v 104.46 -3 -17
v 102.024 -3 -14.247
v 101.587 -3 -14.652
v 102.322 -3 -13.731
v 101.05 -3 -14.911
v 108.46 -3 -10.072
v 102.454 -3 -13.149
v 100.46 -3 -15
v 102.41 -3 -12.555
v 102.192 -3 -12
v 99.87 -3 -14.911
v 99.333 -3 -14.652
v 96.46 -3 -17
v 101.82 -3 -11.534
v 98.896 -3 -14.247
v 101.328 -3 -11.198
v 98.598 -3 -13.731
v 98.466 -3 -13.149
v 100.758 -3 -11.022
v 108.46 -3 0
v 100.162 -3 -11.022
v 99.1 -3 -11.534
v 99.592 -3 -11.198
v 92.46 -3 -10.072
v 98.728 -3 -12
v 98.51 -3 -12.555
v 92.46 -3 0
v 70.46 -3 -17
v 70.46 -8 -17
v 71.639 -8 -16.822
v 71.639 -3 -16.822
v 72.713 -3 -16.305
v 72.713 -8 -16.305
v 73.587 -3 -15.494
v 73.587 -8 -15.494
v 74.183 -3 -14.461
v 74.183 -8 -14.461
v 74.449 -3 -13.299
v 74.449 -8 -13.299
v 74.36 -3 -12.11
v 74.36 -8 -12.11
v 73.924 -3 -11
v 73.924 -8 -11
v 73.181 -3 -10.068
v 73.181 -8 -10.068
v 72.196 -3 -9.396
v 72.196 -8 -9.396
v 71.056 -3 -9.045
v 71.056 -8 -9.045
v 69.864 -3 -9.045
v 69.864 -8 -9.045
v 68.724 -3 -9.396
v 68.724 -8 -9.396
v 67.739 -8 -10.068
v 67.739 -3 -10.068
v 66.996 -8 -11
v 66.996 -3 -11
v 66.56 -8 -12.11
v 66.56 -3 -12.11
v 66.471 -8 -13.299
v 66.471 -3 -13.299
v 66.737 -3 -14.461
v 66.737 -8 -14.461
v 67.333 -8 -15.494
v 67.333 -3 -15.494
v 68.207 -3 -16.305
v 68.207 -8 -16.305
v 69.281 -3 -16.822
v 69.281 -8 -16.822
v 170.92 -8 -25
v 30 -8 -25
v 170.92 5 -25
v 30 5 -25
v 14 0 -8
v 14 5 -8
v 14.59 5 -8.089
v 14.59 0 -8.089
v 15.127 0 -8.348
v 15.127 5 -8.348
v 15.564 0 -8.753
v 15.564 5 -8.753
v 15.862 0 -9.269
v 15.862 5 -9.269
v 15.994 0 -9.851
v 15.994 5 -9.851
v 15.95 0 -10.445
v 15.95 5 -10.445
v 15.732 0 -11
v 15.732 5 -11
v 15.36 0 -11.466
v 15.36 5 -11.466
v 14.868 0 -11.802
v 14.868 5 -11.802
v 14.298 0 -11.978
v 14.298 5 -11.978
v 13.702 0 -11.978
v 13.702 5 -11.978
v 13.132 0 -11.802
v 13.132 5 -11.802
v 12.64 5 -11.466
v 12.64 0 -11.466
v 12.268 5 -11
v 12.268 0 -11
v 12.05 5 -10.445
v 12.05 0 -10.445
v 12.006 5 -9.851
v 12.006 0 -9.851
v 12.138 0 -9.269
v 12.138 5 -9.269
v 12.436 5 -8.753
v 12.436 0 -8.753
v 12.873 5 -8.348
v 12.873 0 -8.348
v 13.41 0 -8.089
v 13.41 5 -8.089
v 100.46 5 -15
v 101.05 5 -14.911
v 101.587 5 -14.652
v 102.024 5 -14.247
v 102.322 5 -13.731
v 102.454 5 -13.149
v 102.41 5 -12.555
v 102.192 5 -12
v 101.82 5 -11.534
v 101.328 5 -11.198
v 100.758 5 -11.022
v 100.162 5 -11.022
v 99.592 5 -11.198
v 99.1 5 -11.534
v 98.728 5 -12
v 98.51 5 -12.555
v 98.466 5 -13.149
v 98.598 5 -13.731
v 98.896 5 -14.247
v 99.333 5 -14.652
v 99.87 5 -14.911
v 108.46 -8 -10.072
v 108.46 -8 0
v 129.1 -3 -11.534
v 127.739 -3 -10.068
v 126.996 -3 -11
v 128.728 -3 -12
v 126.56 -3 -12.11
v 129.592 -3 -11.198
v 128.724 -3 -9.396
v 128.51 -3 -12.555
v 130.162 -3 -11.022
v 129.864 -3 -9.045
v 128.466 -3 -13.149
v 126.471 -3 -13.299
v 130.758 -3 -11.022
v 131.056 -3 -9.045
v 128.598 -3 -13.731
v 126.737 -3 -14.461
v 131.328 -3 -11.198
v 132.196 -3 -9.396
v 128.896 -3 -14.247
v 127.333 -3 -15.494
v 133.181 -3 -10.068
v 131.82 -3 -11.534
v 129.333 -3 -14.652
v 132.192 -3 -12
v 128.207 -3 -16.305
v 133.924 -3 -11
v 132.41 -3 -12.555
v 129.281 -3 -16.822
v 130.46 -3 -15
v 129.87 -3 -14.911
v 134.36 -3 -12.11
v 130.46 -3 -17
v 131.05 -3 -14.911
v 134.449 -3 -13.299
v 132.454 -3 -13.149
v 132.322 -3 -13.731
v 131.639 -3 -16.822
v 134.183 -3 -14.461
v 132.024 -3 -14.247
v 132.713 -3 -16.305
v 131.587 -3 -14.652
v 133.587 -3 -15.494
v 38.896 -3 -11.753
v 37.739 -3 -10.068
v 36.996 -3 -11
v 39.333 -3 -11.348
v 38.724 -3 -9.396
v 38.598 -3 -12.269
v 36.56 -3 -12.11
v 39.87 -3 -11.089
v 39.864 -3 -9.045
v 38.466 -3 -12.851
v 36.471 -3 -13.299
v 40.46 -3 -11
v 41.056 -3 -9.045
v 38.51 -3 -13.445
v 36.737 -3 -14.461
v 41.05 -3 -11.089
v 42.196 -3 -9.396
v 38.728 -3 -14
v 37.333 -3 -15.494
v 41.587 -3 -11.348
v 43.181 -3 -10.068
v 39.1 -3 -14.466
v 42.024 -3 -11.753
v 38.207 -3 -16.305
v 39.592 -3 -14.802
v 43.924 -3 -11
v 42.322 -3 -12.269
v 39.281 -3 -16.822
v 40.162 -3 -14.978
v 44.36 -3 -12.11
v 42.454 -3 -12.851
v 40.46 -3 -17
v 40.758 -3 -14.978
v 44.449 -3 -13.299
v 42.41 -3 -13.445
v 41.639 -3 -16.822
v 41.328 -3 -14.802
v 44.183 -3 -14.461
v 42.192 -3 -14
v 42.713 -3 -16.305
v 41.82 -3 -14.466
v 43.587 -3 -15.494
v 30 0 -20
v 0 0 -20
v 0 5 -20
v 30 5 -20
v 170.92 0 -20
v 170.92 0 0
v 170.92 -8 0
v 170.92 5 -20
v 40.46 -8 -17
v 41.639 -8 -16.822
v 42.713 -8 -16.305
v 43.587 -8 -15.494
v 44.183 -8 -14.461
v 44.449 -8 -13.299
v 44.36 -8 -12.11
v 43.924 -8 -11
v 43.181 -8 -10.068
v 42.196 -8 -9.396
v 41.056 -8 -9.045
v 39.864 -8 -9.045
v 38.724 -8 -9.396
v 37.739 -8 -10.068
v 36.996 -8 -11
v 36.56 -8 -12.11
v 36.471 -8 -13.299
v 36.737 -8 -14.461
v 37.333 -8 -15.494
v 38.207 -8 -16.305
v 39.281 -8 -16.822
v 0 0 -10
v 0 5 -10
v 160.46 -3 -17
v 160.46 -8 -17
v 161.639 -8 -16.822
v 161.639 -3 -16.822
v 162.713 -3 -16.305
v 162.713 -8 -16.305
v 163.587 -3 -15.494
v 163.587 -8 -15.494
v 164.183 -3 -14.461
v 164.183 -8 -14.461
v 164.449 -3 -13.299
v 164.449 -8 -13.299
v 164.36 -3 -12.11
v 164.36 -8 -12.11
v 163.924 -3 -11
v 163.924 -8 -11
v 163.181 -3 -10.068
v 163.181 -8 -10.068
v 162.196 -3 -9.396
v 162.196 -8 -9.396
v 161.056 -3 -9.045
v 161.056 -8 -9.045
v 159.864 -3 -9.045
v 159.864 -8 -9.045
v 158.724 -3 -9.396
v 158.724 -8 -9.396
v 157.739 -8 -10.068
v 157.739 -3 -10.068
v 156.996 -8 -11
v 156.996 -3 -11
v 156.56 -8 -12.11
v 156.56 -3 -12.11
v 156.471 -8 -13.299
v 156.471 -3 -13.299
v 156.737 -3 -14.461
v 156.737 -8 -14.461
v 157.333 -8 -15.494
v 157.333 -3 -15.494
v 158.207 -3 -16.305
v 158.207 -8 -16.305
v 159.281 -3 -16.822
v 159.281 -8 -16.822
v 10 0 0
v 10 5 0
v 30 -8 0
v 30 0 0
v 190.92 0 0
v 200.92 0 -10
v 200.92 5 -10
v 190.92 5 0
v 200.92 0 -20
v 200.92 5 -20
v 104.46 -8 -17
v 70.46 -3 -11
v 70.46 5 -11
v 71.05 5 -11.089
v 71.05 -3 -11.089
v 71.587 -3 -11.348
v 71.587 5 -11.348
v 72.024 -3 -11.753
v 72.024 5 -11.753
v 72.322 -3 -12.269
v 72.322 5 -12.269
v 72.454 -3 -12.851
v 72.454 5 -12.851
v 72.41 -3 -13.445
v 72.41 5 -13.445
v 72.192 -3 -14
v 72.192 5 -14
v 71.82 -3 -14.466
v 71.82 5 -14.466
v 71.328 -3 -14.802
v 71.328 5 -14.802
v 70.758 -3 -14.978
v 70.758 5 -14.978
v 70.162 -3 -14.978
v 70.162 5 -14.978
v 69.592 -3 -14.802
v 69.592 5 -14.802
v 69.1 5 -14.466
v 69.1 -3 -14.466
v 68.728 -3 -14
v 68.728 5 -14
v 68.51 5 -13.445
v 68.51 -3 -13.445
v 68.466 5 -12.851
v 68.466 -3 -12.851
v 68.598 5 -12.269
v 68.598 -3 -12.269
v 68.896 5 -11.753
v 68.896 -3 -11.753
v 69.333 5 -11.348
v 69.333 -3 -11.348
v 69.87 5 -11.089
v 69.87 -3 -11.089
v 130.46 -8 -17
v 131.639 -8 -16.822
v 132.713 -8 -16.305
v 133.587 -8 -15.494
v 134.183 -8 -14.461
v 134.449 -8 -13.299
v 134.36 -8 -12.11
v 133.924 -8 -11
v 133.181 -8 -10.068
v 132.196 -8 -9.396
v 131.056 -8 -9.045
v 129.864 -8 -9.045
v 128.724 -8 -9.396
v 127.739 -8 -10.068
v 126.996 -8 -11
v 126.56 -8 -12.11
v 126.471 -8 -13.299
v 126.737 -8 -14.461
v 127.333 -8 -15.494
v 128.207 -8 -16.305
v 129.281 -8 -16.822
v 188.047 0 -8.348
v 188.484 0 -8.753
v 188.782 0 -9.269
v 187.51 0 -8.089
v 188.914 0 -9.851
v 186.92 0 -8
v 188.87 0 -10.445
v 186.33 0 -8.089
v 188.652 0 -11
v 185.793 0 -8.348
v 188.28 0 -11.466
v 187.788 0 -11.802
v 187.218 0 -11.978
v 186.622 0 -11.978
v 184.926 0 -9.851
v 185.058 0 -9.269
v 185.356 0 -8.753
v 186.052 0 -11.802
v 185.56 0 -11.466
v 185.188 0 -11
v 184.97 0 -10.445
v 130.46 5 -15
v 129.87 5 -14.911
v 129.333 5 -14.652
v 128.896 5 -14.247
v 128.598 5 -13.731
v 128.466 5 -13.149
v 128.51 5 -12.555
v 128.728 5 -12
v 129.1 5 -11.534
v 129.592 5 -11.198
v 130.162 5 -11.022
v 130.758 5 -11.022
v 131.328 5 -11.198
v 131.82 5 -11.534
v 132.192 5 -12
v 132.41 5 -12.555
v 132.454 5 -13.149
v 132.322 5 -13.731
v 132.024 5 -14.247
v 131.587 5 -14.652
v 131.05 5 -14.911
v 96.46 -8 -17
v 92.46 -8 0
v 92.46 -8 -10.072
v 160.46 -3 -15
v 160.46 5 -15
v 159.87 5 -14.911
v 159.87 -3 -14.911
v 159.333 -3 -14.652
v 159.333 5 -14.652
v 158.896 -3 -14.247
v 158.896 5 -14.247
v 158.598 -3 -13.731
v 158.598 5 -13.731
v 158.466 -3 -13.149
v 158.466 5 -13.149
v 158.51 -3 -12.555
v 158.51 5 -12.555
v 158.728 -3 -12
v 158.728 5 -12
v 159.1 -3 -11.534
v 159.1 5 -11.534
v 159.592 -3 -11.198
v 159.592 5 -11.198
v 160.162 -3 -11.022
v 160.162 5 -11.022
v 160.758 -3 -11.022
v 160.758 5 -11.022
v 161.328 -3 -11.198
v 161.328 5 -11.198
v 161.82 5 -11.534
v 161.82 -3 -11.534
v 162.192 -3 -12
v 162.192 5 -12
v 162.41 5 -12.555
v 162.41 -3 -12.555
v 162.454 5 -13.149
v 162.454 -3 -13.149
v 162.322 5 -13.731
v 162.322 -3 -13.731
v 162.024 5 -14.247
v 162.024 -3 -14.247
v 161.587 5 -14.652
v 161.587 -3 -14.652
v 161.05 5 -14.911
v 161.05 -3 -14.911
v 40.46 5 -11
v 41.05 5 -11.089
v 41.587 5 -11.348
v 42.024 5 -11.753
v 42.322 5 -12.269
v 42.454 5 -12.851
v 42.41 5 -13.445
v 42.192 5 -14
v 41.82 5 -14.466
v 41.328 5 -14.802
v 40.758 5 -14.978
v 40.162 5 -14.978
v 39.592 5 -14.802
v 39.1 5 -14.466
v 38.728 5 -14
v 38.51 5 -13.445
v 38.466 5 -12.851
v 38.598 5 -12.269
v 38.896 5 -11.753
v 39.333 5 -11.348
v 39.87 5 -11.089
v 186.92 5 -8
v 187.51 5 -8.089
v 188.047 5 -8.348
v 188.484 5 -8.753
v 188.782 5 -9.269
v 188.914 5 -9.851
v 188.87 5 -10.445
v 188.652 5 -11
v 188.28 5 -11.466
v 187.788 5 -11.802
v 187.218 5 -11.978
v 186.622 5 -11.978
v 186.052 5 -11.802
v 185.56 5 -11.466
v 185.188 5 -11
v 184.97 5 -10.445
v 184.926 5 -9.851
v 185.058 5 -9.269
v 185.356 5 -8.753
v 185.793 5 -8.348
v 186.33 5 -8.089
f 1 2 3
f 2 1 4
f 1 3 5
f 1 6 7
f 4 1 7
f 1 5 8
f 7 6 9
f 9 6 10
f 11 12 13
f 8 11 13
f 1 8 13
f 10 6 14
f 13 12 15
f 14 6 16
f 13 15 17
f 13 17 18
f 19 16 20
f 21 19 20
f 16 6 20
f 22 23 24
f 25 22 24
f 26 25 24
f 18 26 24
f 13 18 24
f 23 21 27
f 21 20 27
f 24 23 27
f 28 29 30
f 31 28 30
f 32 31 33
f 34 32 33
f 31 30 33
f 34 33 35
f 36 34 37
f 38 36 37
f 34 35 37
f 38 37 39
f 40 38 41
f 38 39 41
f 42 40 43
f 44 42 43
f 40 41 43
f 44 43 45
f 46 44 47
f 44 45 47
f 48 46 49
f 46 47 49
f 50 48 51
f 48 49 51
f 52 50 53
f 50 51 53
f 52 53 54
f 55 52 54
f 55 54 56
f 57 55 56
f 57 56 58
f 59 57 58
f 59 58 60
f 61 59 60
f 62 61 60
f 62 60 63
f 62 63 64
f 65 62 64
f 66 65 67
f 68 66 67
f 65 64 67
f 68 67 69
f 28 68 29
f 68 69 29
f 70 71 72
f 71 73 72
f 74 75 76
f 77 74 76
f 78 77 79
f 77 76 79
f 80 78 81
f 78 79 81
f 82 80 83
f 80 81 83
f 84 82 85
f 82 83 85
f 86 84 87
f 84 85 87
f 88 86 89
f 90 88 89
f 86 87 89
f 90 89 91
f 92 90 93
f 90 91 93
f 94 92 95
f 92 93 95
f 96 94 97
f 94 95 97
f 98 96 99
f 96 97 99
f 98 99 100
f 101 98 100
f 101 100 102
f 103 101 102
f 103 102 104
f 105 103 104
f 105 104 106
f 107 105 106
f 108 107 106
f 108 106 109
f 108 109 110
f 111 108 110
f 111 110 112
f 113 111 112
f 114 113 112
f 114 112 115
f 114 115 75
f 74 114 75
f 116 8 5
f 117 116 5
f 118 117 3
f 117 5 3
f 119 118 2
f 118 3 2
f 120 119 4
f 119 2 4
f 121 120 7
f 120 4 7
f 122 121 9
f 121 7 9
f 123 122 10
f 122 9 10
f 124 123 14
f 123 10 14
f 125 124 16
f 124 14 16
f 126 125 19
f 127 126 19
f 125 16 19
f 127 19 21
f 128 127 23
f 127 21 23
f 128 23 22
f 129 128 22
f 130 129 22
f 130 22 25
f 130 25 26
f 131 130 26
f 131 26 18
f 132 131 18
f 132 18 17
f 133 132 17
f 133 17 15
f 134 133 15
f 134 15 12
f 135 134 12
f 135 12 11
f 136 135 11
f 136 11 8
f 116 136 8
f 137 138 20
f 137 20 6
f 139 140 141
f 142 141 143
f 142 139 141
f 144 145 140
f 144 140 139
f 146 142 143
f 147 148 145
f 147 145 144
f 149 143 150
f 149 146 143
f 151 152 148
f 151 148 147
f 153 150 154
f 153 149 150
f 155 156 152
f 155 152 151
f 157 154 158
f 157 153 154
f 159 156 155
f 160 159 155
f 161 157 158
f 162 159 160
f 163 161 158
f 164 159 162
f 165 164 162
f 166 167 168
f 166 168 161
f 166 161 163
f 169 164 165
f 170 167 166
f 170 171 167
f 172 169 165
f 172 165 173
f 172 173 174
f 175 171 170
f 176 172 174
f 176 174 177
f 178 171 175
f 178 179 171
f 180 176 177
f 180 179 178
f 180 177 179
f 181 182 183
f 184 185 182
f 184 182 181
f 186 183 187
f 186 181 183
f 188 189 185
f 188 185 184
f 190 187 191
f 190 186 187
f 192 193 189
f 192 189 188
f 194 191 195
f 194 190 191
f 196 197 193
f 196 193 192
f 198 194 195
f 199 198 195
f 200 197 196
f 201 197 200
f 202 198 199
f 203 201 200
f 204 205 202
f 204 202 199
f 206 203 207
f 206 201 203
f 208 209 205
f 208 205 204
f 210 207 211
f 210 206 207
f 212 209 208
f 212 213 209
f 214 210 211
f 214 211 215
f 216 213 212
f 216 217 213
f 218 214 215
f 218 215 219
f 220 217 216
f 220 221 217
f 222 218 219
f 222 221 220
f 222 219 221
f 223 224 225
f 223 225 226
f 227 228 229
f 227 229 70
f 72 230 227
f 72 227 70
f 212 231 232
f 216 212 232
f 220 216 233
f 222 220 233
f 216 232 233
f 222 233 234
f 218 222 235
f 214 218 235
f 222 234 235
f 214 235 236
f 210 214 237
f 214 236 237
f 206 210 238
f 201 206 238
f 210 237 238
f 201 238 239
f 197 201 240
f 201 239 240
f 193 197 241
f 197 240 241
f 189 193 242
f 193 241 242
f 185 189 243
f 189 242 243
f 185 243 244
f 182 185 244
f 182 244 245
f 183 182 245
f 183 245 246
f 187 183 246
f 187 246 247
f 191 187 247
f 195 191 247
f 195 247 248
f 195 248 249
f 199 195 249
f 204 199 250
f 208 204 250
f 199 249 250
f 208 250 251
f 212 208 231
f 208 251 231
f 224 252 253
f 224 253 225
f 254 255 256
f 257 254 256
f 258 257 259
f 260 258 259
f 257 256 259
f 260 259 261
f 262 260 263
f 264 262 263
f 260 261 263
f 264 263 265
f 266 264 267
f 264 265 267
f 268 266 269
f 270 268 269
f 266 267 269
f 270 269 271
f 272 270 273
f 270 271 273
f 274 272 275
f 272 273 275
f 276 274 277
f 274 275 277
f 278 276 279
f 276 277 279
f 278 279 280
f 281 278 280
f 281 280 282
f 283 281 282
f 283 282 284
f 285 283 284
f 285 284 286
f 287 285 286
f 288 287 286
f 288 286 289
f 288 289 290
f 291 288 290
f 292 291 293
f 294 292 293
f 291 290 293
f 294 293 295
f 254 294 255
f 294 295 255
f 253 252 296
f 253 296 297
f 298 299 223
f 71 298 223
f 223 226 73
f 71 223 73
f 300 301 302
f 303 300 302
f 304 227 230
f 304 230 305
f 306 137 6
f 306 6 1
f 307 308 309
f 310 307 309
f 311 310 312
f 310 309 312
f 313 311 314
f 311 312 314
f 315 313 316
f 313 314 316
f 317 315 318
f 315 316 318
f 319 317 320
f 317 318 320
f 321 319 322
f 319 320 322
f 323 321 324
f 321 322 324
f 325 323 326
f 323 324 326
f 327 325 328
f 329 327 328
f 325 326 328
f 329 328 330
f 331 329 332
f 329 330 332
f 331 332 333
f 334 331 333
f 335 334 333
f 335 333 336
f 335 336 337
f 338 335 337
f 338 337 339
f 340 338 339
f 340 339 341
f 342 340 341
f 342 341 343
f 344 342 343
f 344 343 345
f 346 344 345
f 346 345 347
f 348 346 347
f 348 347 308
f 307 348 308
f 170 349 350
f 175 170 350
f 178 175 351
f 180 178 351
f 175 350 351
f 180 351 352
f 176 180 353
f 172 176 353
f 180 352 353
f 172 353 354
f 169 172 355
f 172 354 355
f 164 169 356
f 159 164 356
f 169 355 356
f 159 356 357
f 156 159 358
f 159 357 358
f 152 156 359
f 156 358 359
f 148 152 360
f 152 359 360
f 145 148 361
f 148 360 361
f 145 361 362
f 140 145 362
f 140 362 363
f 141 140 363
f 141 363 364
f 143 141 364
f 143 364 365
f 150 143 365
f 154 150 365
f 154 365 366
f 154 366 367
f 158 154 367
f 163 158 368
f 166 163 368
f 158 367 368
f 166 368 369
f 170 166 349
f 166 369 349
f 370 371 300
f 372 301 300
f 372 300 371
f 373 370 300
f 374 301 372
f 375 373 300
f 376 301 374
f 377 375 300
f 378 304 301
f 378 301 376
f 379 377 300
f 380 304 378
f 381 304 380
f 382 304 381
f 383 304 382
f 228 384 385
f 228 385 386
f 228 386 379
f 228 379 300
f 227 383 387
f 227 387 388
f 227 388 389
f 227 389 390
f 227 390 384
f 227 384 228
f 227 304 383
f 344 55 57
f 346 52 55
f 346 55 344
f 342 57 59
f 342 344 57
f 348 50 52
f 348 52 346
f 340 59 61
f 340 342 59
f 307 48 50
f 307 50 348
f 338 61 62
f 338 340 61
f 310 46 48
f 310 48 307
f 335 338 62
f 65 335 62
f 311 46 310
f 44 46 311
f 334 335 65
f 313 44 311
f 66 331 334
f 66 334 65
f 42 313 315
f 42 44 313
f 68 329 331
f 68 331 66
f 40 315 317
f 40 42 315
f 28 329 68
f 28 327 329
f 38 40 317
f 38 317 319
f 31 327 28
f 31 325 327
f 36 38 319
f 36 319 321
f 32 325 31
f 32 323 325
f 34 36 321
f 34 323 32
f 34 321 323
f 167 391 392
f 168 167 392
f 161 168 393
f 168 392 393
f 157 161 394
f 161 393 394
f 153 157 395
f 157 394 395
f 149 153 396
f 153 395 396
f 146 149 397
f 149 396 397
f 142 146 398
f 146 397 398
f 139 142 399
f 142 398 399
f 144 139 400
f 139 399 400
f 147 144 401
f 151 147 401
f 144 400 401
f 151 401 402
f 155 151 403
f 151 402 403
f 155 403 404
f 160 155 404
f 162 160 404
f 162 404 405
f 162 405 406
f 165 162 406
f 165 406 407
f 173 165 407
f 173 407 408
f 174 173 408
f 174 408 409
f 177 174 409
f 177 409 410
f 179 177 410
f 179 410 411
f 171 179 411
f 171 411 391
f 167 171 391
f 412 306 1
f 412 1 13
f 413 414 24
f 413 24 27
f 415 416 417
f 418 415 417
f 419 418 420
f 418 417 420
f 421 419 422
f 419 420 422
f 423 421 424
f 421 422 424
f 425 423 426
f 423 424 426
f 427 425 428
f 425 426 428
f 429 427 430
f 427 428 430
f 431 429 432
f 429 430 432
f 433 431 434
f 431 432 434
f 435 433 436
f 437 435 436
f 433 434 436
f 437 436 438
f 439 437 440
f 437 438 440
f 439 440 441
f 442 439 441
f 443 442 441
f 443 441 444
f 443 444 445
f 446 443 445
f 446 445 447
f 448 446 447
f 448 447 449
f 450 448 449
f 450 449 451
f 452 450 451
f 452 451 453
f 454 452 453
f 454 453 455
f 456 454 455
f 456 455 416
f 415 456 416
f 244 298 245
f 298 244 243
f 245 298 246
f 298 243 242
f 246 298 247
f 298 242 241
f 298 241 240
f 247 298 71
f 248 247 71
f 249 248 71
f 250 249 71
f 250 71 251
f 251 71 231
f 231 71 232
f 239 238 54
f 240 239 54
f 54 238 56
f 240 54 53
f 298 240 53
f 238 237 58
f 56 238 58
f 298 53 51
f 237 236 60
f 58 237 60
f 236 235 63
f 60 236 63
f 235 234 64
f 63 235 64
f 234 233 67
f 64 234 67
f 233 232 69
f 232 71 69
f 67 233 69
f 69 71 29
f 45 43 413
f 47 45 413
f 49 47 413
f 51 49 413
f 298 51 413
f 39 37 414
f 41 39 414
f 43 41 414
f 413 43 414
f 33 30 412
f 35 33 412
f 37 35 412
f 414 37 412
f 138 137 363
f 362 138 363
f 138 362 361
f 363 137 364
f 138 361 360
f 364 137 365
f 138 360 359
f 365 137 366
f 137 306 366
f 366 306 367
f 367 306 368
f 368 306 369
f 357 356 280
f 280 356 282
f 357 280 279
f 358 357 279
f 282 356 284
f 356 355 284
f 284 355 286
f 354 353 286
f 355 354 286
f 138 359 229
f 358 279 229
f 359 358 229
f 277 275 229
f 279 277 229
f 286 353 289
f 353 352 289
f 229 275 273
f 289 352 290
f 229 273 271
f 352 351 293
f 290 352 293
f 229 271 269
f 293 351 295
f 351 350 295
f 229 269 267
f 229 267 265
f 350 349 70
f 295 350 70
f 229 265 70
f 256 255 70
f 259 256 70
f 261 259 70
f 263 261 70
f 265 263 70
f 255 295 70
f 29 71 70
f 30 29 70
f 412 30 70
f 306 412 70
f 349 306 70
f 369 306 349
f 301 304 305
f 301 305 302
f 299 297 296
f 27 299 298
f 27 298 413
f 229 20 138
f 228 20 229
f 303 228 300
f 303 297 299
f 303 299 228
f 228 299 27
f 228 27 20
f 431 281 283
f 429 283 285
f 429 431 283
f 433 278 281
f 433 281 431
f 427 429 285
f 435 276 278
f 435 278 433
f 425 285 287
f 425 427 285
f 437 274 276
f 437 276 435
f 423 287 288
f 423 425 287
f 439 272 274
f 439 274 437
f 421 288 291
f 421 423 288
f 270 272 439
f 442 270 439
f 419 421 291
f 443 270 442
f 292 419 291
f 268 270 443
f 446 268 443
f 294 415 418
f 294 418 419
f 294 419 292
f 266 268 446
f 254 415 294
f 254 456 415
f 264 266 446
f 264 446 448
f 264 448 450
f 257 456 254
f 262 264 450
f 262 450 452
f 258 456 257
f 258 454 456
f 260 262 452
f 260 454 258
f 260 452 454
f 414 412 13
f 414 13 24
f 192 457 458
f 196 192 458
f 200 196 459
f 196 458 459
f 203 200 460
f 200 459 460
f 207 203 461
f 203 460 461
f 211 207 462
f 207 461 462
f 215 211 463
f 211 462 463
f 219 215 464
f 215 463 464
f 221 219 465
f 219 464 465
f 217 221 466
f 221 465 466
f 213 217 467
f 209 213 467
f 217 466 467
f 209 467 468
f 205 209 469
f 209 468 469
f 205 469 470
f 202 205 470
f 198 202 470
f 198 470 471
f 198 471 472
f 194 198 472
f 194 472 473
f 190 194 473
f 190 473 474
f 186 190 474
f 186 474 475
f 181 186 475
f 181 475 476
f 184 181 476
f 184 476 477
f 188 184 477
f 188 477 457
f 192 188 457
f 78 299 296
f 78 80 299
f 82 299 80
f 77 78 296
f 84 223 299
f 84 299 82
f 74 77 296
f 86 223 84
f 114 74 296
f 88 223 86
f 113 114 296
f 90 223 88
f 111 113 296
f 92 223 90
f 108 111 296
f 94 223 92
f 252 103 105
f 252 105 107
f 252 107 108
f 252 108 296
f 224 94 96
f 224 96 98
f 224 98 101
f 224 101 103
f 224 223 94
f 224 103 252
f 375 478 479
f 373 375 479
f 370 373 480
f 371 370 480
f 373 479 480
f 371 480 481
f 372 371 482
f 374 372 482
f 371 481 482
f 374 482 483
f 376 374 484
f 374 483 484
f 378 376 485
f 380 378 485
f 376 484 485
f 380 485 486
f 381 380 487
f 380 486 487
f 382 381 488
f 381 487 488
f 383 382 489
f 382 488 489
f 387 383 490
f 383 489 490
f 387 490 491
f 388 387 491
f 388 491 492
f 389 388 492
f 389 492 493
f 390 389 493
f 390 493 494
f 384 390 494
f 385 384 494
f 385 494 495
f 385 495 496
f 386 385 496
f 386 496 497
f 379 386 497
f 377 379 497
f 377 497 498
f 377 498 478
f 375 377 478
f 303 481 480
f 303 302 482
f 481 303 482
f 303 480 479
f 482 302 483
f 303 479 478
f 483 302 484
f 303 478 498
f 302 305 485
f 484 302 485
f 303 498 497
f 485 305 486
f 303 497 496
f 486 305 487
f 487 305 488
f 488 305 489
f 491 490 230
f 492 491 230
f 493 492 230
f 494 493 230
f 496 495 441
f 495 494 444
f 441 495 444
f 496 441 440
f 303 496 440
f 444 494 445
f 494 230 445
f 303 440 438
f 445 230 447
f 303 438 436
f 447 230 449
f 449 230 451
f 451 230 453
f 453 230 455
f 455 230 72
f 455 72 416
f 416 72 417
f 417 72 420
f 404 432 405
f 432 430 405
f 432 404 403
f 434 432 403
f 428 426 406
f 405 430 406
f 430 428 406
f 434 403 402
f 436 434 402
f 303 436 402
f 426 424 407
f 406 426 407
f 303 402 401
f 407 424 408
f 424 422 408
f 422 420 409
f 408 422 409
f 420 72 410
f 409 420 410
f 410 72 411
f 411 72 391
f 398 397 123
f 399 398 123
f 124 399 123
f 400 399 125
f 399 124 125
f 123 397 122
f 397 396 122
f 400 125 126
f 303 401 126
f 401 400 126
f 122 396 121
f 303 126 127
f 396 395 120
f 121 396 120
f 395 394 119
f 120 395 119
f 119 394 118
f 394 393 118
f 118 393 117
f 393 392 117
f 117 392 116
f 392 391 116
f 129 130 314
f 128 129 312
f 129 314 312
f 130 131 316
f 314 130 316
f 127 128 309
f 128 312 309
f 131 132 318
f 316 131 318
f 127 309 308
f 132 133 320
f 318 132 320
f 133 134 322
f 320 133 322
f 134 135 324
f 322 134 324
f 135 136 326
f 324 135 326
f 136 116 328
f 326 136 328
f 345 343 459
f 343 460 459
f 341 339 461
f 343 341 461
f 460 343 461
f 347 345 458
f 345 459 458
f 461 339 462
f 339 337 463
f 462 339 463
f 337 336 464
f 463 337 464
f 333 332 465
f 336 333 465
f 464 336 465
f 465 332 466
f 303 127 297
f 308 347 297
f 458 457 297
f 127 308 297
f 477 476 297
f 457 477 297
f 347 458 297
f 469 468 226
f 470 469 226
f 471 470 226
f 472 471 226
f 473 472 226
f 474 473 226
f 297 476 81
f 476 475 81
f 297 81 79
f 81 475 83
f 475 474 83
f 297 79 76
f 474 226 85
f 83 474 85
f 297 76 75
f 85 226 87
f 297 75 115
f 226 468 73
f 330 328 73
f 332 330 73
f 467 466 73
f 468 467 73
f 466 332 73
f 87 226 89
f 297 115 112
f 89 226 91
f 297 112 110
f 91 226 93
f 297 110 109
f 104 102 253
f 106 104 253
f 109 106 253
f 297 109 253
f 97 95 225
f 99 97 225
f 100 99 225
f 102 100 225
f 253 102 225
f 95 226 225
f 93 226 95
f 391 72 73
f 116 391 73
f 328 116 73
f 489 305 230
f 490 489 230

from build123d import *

# Parameters (mm, degrees)
BOSS_EXTRUDE1_DEPTH = 5
SKETCH2_R           = 2
CUT_EXTRUDE1_DEPTH  = 203.531099834
SKETCH3_W           = 140.92
SKETCH3_H           = 25
BOSS_EXTRUDE2_DEPTH = 8
SKETCH4_R           = 2
CUT_EXTRUDE2_DEPTH  = 203.886289335
SKETCH5_R           = 4
CUT_EXTRUDE3_DEPTH  = 5
CHAMFER1_SIZE       = 10
CUT_EXTRUDE4_DEPTH  = 5
SKETCH8_R           = 2
CUT_EXTRUDE5_DEPTH  = 203.627358469


with BuildPart() as part:
    # Sketch1 → Boss-Extrude1 (new body)
    with BuildSketch(Plane(origin=(0, 0, 0), x_dir=(1, 0, 0), z_dir=(0, 1, 0))):
        Polygon((170.92, 20), (200.92, 20), (200.92, 0), (0, 0), (0, 20), (30, 20), (30, 25), (170.92, 25), align=None)
    extrude(amount=BOSS_EXTRUDE1_DEPTH)

    # Sketch2 → Cut-Extrude1 (cut, through all)
    with BuildSketch(Plane(origin=(0, 5, 0), x_dir=(1, 0, 0), z_dir=(0, 1, 0))):
        with Locations(Location((14, 10, 0), (0, 0, 270))):
            Circle(SKETCH2_R)
        with Locations(Location((186.92, 10, 0), (0, 0, 270))):
            Circle(SKETCH2_R)
    extrude(amount=-CUT_EXTRUDE1_DEPTH, mode=Mode.SUBTRACT)

    # Sketch3 → Boss-Extrude2 (add)
    with BuildSketch(Plane(origin=(0, 0, 0), x_dir=(1, 0, 0), z_dir=(0, 1, 0))):
        with Locations((100.46, 12.5)):
            Rectangle(SKETCH3_W, SKETCH3_H)
    extrude(amount=-BOSS_EXTRUDE2_DEPTH)

    # Sketch4 → Cut-Extrude2 (cut, through all)
    with BuildSketch(Plane(origin=(0, 5, 0), x_dir=(1, 0, 0), z_dir=(0, 1, 0))):
        with Locations(Location((70.46, 13, 0), (0, 0, 270))):
            Circle(SKETCH4_R)
        with Locations(Location((40.46, 13, 0), (0, 0, 270))):
            Circle(SKETCH4_R)
        with Locations(Location((160.46, 13, 0), (0, 0, 90))):
            Circle(SKETCH4_R)
        with Locations(Location((130.46, 13, 0), (0, 0, 90))):
            Circle(SKETCH4_R)
    extrude(amount=-CUT_EXTRUDE2_DEPTH, mode=Mode.SUBTRACT)

    # Sketch5 → Cut-Extrude3 (cut)
    with BuildSketch(Plane.XZ.offset(8)):
        with Locations(Location((40.46, -13, 0), (0, 0, 270))):
            Circle(SKETCH5_R)
        with Locations(Location((130.46, -13, 0), (0, 0, 270))):
            Circle(SKETCH5_R)
        with Locations(Location((160.46, -13, 0), (0, 0, 270))):
            Circle(SKETCH5_R)
        with Locations(Location((70.46, -13, 0), (0, 0, 270))):
            Circle(SKETCH5_R)
    extrude(amount=-CUT_EXTRUDE3_DEPTH, mode=Mode.SUBTRACT)

    # Chamfer1
    chamfer1_edges = [part.edges().sort_by_distance(p)[0] for p in [
        (200.92, 2.5, 0),
        (0, 2.5, 0),
    ]]
    chamfer(chamfer1_edges, length=CHAMFER1_SIZE)

    # Sketch6 → Cut-Extrude4 (cut)
    with BuildSketch(Plane.XZ.offset(8)):
        Polygon((92.46, 0), (108.46, 0), (108.46, -10.07179677), (104.46, -17), (96.46, -17), (92.46, -10.07179677), align=None)
    extrude(amount=-CUT_EXTRUDE4_DEPTH, mode=Mode.SUBTRACT)

    # Sketch8 → Cut-Extrude5 (cut, through all)
    with BuildSketch(Plane.XZ.offset(3)):
        with Locations(Location((100.46, -13, 0), (0, 0, 270))):
            Circle(SKETCH8_R)
    extrude(amount=-CUT_EXTRUDE5_DEPTH, mode=Mode.SUBTRACT)


solid = part.part
